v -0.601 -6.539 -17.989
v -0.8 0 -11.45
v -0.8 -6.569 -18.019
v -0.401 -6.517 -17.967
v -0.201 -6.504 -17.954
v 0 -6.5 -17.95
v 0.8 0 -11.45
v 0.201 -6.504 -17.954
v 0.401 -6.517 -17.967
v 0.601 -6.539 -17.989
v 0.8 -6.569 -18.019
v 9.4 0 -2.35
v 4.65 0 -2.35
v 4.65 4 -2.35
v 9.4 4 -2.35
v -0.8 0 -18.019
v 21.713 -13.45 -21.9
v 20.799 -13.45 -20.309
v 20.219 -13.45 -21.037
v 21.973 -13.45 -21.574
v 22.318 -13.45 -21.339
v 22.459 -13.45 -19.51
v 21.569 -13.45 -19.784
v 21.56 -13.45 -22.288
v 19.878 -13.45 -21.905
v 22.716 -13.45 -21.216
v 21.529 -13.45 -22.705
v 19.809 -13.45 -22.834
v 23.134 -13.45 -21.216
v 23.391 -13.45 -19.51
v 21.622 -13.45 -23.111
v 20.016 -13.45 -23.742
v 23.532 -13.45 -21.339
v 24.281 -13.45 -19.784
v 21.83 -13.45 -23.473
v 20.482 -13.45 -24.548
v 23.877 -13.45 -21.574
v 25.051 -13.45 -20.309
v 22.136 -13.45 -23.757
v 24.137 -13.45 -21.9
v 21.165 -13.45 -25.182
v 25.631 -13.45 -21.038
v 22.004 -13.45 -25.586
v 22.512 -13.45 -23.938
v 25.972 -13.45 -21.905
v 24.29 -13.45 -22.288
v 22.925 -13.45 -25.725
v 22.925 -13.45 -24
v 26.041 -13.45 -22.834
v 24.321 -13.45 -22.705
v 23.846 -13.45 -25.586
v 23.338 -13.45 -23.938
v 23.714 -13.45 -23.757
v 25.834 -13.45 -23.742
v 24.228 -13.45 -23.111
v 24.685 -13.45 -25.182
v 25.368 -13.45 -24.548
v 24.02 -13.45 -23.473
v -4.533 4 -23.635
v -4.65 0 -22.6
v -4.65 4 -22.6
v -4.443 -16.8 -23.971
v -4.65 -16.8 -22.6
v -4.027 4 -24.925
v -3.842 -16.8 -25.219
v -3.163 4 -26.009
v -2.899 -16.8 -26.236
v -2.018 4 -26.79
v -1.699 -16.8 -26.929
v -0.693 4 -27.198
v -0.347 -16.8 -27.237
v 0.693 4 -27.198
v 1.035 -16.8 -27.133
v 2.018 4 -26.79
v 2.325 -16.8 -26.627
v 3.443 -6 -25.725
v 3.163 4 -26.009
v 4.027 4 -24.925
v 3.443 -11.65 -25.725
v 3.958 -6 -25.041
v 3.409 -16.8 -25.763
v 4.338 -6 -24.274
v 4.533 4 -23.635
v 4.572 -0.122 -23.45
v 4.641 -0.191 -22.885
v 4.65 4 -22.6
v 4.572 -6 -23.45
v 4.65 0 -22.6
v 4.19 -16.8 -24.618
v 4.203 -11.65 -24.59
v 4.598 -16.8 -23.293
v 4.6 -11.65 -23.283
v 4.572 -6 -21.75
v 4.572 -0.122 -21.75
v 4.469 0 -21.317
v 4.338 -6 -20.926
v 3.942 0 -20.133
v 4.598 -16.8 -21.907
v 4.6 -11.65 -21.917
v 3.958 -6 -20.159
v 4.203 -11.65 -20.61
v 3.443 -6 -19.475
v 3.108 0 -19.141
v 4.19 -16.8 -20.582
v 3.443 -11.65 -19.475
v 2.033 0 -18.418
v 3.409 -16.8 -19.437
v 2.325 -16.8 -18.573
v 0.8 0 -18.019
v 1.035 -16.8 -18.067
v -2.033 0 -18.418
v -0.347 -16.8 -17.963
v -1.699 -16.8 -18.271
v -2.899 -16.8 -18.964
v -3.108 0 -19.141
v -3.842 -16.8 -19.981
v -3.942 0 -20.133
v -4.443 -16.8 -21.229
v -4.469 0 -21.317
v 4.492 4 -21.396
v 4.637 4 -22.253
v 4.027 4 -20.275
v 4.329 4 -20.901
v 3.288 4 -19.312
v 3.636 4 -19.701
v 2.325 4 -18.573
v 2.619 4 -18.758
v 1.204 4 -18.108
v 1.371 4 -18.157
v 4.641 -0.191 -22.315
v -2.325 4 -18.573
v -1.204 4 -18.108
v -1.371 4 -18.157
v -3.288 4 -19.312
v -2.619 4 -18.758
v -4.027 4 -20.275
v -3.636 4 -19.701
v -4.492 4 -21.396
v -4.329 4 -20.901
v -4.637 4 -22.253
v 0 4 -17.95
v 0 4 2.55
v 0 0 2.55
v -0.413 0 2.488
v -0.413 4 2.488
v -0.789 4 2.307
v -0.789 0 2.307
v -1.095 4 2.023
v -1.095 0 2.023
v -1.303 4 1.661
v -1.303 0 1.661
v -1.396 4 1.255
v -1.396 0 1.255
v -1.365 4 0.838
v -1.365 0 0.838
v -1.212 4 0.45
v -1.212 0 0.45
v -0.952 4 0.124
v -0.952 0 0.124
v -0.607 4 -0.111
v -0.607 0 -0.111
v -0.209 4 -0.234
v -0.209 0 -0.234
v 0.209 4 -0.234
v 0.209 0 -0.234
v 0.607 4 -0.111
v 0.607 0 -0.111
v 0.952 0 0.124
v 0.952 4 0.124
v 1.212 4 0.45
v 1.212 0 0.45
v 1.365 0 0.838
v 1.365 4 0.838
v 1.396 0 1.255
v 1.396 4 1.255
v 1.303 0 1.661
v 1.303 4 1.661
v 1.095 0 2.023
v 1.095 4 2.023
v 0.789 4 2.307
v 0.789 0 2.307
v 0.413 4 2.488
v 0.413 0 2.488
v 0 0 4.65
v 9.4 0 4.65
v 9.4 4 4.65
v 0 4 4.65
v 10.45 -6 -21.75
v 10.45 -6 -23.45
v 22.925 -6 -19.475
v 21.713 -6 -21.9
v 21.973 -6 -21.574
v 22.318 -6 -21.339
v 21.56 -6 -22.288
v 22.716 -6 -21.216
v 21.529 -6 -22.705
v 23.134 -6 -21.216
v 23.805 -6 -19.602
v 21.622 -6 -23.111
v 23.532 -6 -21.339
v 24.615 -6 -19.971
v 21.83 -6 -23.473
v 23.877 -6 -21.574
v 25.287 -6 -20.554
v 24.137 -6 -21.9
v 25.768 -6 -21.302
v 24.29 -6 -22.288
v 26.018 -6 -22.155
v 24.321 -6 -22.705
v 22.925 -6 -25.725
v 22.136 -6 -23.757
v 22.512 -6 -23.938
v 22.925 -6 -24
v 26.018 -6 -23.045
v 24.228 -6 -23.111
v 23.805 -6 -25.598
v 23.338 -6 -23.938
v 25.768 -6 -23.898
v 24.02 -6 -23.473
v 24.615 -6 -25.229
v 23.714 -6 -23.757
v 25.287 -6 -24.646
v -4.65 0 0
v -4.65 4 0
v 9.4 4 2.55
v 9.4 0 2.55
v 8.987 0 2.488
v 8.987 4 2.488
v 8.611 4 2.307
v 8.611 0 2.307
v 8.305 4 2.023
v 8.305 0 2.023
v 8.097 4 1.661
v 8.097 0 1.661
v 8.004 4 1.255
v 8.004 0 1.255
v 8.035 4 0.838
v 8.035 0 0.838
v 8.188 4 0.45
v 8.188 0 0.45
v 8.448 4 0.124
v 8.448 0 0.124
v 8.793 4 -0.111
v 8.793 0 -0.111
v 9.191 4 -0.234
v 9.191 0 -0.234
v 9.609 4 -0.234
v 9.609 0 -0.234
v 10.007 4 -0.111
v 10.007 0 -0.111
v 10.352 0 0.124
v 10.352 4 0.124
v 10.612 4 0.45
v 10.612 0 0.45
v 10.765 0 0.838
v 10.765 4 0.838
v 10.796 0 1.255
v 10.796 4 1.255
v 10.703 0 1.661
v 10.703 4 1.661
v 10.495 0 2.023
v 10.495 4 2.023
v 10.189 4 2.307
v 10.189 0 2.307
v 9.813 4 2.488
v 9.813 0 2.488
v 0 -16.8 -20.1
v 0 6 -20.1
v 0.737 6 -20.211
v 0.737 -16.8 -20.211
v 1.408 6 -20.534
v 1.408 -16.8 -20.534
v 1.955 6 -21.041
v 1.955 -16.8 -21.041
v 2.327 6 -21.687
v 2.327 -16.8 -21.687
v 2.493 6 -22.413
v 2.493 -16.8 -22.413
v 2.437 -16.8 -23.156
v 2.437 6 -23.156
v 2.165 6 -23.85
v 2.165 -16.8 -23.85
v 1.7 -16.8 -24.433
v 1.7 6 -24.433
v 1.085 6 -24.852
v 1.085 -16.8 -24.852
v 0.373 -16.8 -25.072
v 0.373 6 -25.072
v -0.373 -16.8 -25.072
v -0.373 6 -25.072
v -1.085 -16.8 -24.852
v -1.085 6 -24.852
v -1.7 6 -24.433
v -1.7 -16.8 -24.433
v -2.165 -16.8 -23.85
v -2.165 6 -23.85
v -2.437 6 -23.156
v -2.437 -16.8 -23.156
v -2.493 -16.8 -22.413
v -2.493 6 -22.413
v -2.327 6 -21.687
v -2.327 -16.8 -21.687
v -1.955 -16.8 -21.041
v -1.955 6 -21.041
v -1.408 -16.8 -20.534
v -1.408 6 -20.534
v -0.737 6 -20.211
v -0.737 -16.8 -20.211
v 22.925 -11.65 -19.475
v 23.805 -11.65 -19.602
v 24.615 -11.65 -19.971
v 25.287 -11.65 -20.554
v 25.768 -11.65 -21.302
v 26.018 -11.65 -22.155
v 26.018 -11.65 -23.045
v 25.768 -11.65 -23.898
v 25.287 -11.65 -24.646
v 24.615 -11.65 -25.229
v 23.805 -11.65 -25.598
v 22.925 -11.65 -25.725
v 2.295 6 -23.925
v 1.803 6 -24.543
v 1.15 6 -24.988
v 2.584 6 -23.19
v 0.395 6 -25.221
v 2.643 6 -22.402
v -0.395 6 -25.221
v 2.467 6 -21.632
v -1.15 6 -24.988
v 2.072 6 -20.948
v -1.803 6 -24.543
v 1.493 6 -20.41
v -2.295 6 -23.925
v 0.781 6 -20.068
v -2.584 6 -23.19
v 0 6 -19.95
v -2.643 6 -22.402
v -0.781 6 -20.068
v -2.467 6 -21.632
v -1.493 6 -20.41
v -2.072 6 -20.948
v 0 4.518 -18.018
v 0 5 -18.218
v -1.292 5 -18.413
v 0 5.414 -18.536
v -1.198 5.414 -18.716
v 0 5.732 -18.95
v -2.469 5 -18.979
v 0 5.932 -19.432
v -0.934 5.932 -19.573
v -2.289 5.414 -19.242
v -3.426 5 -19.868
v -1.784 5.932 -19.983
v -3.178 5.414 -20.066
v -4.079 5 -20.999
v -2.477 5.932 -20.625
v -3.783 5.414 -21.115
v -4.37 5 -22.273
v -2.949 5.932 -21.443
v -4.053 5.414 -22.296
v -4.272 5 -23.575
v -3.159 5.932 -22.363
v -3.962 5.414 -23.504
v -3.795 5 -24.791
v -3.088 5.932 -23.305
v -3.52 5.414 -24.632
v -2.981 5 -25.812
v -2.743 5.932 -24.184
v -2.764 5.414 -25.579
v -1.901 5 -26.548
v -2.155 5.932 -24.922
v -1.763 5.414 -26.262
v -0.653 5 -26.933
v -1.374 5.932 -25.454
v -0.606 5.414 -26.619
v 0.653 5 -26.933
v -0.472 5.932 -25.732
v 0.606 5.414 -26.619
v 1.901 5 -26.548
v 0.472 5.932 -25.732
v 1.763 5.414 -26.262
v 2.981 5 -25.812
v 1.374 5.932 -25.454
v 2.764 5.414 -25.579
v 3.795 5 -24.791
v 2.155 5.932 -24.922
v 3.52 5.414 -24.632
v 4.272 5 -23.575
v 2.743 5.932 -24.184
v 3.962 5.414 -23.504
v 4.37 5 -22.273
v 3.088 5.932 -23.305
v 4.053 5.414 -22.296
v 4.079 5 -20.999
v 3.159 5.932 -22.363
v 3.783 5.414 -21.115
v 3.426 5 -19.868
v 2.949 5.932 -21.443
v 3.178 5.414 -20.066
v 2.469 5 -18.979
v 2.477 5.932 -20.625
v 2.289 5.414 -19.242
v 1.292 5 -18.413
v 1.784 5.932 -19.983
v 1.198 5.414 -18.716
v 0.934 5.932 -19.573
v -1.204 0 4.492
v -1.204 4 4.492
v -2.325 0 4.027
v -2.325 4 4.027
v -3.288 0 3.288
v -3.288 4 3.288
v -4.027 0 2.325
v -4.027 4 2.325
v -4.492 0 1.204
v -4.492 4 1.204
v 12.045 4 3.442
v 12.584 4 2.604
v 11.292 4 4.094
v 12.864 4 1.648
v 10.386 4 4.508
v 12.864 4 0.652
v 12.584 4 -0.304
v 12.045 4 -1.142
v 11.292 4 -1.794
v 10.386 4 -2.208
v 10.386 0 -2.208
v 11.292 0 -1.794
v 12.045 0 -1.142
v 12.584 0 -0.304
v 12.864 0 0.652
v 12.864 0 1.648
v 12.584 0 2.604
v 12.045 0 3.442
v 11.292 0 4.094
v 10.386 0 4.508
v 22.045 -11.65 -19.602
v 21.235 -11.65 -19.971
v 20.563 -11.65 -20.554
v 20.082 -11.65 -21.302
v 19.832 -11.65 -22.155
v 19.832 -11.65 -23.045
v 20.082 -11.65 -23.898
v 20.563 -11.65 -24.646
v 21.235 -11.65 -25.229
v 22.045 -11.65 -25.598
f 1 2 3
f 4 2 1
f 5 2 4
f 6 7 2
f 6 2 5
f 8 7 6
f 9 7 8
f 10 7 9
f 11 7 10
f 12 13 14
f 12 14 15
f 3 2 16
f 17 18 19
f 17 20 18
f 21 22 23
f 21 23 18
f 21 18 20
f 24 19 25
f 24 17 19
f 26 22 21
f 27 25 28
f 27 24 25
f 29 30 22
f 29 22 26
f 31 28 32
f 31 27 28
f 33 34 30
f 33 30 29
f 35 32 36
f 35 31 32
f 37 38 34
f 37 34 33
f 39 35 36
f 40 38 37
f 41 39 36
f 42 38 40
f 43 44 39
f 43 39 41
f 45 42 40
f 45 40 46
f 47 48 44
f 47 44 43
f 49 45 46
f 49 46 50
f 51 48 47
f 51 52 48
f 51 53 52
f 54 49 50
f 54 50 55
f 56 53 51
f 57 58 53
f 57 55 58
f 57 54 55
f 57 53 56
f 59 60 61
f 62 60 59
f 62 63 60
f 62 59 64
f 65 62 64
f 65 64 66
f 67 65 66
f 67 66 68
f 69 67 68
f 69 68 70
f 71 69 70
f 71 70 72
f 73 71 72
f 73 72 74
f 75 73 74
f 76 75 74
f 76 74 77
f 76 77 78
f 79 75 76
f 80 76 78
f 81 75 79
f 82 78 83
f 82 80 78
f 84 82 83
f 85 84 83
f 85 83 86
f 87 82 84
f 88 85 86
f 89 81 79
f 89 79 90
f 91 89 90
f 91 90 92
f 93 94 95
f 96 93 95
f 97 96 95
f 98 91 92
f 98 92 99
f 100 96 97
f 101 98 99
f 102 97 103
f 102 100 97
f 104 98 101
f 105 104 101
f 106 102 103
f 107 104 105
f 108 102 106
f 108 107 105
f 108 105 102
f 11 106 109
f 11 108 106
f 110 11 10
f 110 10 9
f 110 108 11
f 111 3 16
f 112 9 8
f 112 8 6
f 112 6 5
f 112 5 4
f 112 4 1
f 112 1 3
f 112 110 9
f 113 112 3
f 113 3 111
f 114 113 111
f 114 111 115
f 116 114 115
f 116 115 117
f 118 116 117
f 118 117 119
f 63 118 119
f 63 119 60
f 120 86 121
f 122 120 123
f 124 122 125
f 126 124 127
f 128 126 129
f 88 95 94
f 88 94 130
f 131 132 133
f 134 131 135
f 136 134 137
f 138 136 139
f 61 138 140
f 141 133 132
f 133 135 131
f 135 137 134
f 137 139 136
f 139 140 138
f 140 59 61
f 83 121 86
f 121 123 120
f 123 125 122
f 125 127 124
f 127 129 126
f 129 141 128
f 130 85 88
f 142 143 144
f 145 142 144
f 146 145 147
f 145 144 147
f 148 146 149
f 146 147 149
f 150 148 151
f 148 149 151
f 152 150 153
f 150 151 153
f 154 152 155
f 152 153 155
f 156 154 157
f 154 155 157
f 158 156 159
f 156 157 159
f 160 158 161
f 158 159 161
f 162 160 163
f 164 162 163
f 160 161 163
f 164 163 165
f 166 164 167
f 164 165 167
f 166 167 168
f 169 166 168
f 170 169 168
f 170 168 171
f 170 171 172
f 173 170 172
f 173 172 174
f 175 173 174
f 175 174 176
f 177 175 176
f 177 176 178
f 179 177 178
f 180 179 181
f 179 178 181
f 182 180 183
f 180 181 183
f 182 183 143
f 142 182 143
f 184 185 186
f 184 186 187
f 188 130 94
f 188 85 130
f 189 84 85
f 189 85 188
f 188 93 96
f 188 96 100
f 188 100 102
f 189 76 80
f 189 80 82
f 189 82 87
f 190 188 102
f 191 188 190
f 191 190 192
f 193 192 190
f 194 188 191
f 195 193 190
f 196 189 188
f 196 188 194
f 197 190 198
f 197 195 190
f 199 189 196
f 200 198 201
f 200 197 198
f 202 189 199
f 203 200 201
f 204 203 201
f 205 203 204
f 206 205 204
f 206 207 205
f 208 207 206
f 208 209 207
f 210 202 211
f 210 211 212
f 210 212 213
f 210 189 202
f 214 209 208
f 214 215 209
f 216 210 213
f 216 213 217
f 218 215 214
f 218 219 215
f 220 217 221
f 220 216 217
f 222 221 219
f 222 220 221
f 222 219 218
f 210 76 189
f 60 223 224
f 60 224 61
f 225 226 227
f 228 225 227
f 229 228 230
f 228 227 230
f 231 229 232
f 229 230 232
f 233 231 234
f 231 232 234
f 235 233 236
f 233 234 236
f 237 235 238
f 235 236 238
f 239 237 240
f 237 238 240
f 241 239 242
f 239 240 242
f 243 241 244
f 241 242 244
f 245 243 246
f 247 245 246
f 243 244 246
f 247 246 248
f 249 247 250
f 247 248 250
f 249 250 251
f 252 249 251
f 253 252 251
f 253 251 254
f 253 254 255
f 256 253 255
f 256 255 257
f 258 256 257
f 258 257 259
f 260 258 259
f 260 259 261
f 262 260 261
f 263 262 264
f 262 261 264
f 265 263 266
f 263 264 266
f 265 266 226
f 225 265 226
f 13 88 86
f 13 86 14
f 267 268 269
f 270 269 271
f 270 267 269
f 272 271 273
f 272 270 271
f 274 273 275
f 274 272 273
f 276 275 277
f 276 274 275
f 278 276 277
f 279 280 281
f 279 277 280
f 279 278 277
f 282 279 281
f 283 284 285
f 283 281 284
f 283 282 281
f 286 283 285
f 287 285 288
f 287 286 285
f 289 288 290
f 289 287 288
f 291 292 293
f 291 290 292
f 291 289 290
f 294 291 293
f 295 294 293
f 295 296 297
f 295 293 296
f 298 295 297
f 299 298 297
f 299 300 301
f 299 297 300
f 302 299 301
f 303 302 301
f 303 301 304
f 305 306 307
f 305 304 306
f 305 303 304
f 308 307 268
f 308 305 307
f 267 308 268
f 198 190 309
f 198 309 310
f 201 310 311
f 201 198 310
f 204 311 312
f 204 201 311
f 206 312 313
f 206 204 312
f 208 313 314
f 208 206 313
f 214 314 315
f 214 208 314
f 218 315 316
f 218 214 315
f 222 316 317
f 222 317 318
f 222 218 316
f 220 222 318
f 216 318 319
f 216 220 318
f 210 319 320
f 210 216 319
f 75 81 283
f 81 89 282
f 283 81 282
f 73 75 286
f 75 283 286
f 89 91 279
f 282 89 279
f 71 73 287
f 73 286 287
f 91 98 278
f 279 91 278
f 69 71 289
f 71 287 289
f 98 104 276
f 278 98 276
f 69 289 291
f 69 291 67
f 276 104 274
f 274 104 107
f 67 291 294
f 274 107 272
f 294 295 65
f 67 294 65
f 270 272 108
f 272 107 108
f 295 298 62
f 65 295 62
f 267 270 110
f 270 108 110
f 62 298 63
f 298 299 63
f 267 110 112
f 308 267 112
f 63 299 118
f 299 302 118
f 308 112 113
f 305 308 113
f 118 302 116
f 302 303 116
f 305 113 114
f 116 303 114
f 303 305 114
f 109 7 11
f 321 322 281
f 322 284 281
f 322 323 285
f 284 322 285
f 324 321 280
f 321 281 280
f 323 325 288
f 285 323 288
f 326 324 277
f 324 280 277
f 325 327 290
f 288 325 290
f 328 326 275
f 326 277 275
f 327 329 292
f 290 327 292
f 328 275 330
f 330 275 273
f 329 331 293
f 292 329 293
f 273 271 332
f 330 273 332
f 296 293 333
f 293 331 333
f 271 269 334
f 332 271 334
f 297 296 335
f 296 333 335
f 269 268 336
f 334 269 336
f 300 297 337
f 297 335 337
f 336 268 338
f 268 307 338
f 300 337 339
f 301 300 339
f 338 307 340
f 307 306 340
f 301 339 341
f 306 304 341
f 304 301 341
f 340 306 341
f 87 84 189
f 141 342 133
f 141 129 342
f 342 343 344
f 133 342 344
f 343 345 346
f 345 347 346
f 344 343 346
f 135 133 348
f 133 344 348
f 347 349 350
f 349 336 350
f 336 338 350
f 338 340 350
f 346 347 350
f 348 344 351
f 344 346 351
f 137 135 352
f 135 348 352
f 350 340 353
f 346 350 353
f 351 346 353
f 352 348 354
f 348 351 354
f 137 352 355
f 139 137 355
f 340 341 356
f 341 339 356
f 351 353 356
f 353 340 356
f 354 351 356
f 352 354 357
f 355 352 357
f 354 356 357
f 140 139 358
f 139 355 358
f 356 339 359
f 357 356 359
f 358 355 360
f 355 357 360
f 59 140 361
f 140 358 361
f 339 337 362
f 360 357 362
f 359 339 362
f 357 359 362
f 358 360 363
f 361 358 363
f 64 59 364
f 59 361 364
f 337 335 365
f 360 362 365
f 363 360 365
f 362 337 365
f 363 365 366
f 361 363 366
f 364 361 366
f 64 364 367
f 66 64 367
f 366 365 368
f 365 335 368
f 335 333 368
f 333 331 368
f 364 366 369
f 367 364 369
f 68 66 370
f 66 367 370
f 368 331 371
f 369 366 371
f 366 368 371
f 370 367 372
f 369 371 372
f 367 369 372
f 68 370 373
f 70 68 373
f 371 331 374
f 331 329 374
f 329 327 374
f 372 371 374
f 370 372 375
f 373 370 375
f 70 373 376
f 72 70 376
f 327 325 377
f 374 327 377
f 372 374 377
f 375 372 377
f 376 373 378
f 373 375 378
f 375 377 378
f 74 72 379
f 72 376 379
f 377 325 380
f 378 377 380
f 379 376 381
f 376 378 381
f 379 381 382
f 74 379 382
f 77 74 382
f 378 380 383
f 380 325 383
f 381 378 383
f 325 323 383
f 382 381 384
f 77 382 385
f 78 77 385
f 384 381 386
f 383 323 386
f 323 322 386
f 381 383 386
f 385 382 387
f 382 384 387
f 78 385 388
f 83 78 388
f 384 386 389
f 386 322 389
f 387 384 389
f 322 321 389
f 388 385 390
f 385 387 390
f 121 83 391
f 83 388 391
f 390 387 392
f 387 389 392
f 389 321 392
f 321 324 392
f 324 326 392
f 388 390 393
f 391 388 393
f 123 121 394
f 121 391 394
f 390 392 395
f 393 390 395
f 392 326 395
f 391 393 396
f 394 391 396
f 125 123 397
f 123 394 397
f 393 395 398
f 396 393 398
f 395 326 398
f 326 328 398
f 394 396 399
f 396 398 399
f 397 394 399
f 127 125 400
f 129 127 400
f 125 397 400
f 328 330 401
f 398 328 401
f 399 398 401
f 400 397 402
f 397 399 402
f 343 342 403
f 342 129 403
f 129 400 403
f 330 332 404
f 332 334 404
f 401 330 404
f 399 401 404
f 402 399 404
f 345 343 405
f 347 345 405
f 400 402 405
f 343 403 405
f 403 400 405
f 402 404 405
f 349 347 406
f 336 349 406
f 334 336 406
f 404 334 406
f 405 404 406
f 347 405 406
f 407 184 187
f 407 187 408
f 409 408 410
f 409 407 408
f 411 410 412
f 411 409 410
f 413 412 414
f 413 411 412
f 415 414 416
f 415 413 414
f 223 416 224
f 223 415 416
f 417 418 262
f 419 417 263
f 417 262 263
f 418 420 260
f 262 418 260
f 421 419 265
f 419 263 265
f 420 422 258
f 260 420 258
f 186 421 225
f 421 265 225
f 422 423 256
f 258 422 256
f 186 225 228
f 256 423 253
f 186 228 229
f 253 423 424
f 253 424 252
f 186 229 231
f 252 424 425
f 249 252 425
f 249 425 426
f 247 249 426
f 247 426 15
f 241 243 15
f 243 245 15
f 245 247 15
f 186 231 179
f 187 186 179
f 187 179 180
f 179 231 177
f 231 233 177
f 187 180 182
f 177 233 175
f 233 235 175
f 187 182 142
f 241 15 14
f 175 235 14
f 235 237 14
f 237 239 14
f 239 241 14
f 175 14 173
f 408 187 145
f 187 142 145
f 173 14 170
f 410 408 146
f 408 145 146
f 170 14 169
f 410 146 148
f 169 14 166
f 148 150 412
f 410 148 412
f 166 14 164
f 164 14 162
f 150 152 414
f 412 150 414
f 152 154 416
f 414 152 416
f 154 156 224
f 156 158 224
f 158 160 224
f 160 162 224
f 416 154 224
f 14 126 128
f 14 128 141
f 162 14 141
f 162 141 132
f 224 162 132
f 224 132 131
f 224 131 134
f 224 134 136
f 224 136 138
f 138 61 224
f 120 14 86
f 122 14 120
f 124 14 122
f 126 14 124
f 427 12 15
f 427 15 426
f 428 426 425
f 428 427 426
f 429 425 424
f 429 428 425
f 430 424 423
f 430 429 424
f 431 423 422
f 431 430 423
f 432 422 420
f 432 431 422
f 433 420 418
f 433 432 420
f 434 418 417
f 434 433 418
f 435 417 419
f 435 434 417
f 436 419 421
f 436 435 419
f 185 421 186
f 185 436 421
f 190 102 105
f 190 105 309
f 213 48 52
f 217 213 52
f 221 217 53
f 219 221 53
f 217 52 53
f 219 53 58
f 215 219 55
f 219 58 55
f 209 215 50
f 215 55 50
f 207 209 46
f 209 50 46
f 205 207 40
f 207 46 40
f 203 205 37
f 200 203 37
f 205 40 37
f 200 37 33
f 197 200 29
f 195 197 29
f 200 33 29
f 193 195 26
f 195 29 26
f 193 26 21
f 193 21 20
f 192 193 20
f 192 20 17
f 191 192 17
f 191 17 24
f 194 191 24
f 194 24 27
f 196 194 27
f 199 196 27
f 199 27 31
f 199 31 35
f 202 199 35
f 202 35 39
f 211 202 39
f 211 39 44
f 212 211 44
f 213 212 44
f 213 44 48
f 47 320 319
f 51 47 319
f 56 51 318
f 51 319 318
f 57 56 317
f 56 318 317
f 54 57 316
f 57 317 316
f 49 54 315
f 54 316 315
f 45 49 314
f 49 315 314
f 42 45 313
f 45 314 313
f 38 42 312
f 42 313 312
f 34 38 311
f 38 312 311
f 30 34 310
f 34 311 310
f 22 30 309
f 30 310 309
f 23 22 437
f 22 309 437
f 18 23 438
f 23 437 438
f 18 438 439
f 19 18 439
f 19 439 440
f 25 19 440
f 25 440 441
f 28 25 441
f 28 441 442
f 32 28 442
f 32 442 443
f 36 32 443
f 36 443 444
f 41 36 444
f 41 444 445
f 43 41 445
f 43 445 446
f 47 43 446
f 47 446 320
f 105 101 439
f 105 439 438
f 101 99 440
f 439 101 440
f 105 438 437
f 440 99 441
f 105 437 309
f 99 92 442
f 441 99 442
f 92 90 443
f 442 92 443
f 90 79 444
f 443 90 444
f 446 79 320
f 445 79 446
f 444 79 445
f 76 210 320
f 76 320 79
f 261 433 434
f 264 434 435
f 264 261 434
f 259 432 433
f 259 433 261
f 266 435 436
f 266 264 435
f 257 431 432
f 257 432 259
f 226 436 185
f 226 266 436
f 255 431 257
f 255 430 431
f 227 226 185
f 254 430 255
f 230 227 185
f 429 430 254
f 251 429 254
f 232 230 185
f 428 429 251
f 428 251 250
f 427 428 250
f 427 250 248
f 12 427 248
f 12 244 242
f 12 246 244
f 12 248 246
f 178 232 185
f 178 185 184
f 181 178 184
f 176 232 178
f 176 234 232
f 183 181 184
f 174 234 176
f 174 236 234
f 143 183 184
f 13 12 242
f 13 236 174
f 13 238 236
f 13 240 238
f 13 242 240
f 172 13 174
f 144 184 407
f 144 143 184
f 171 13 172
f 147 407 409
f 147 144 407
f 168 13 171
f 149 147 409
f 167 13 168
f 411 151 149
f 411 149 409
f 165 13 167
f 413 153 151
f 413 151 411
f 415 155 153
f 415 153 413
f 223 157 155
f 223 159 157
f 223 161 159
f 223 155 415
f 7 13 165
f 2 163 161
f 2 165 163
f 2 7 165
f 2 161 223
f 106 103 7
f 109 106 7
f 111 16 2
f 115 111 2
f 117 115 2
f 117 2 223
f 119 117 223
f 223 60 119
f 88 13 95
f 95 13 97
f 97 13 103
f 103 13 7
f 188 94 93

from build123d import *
from build123d.topology import SkipClean

# Parameters (mm, degrees)
SKETCH2_R           = 1.4
SKETCH2_R_2         = 2.5
BOSS_EXTRUDE1_DEPTH = 4
BOSS_EXTRUDE2_START = 16.8
SKETCH3_R           = 4.65
SKETCH3_R_2         = 2.5
BOSS_EXTRUDE2_DEPTH = 16.8
SKETCH5_R           = 4.65
SKETCH5_R_2         = 2.5
BOSS_EXTRUDE3_DEPTH = 2
FILLET1_R           = 2
RIB1_REACH          = 36.514
SKETCH6_WALL_W      = 80.220281068
SKETCH6_WALL_H      = 1.6
BOSS_EXTRUDE4_DEPTH = 5.65
SKETCH8_R           = 3.125
BOSS_EXTRUDE5_DEPTH = 1.8
SKETCH9_R           = 1.4
CUT_EXTRUDE1_DEPTH  = 43.420130834
RIB2_REACH          = 43.272
SKETCH10_WALL_W     = 92.747093244
SKETCH10_WALL_H     = 1.7


with BuildPart() as part:
    # Sketch2 → Boss-Extrude1 (new body)
    with BuildSketch(Plane(origin=(0, 0, 0), x_dir=(1, 0, 0), z_dir=(0, 1, 0))):
        with BuildLine():
            Line((-9.4, -4.65), (0, -4.65))
            ThreePointArc((0, -4.65), (3.288046533, -3.288046533), (4.65, 0))
            Line((4.65, 0), (4.65, 22.6))
            ThreePointArc((4.65, 22.6), (0, 27.25), (-4.65, 22.6))
            Line((-4.65, 22.6), (-4.65, 2.35))
            Line((-4.65, 2.35), (-9.4, 2.35))
            ThreePointArc((-9.4, 2.35), (-12.9, -1.15), (-9.4, -4.65))
        make_face()
        with Locations(Location((-9.4, -1.15, 0), (0, 0, 270))):
            Circle(SKETCH2_R, mode=Mode.SUBTRACT)
        with Locations(Location((0, -1.15, 0), (0, 0, 270))):
            Circle(SKETCH2_R, mode=Mode.SUBTRACT)
        with Locations(Location((0, 22.6, 0), (0, 0, 270))):
            Circle(SKETCH2_R_2, mode=Mode.SUBTRACT)
    extrude(amount=BOSS_EXTRUDE1_DEPTH)

    # Sketch3 → Boss-Extrude2 (add)
    with BuildSketch(Plane.XZ.offset(BOSS_EXTRUDE2_START)):
        with Locations((0, -22.6)):
            Circle(SKETCH3_R)
        with Locations(Location((0, -22.6, 0), (0, 0, 90))):
            Circle(SKETCH3_R_2, mode=Mode.SUBTRACT)
    extrude(amount=-BOSS_EXTRUDE2_DEPTH)

    # Sketch5 → Boss-Extrude3 (add)
    with SkipClean():  # the faces are left unmerged after this step: merging them gives an invalid solid
        with BuildSketch(Plane(origin=(0, 4, 0), x_dir=(1, 0, 0), z_dir=(0, 1, 0))):
            with Locations(Location((0, 22.6, 0), (0, 0, 270))):
                Circle(SKETCH5_R)
            with Locations(Location((0, 22.6, 0), (0, 0, 270))):
                Circle(SKETCH5_R_2, mode=Mode.SUBTRACT)
        extrude(amount=BOSS_EXTRUDE3_DEPTH)

    # Fillet1
    fillet1_edges = [part.edges().sort_by_distance(p)[0] for p in [
        (0, 6, -27.25),
    ]]
    fillet(fillet1_edges, radius=FILLET1_R - 0.0001)  # a hair under: the kernel refuses the full size

    # Sketch6 wall → Rib1 (add, up to next)
    with BuildSketch(Plane(origin=(0, -3.25, -14.7), x_dir=(0, -0.707106781187, -0.707106781187), z_dir=(0, 0.707106781187, -0.707106781187)), mode=Mode.PRIVATE) as rib1_sk1:
        Rectangle(SKETCH6_WALL_W, SKETCH6_WALL_H)
    rib1_tool1 = extrude(rib1_sk1.sketch, amount=RIB1_REACH, mode=Mode.PRIVATE) - part.part
    add(rib1_tool1.solids().sort_by_distance((0, -3.25, -14.7))[0])


with BuildPart() as body_2:
    # Mirror1: mirrored copy
    add(part.part.mirror(Plane(origin=(0, 0, 0), x_dir=(0, 0, 1), z_dir=(1, 0, 0))))

    # Sketch7 → Boss-Extrude4 (add)
    with BuildSketch(Plane(origin=(0, -6, 0), x_dir=(1, 0, 0), z_dir=(0, 1, 0))):
        with BuildLine():
            Line((22.925, 25.725), (3.443381332, 25.725))
            ThreePointArc((3.443381332, 25.725), (4.65, 22.6), (3.443381332, 19.475))
            Line((3.443381332, 19.475), (22.925, 19.475))
            ThreePointArc((22.925, 19.475), (26.05, 22.6), (22.925, 25.725))
        make_face()
    extrude(amount=-BOSS_EXTRUDE4_DEPTH)

    # Sketch8 → Boss-Extrude5 (add)
    with SkipClean():  # the faces are left unmerged after this step: merging them gives an invalid solid
        with BuildSketch(Plane.XZ.offset(11.65)):
            with Locations(Location((22.925, -22.6, 0), (0, 0, 270))):
                Circle(SKETCH8_R)
        extrude(amount=BOSS_EXTRUDE5_DEPTH)
    add(body_2.part.scale(1), mode=Mode.REPLACE)  # the faces are merged on a copy

    # Sketch9 → Cut-Extrude1 (cut, through all)
    with BuildSketch(Plane.XZ.offset(13.45)):
        with Locations(Location((22.925, -22.6, 0), (0, 0, 270))):
            Circle(SKETCH9_R)
    extrude(amount=-CUT_EXTRUDE1_DEPTH, mode=Mode.SUBTRACT)

    # Sketch10 wall → Rib2 (add, up to next)
    with BuildSketch(Plane(origin=(7.55, -3.1, -22.6), x_dir=(0.707106781187, -0.707106781187, 0), z_dir=(0.707106781187, 0.707106781187, 0)), mode=Mode.PRIVATE) as rib2_sk1:
        Rectangle(SKETCH10_WALL_W, SKETCH10_WALL_H)
    rib2_tool1 = extrude(rib2_sk1.sketch, amount=-RIB2_REACH, mode=Mode.PRIVATE) - body_2.part
    add(rib2_tool1.solids().sort_by_distance((7.55, -3.1, -22.6))[0])


solid = body_2.part
